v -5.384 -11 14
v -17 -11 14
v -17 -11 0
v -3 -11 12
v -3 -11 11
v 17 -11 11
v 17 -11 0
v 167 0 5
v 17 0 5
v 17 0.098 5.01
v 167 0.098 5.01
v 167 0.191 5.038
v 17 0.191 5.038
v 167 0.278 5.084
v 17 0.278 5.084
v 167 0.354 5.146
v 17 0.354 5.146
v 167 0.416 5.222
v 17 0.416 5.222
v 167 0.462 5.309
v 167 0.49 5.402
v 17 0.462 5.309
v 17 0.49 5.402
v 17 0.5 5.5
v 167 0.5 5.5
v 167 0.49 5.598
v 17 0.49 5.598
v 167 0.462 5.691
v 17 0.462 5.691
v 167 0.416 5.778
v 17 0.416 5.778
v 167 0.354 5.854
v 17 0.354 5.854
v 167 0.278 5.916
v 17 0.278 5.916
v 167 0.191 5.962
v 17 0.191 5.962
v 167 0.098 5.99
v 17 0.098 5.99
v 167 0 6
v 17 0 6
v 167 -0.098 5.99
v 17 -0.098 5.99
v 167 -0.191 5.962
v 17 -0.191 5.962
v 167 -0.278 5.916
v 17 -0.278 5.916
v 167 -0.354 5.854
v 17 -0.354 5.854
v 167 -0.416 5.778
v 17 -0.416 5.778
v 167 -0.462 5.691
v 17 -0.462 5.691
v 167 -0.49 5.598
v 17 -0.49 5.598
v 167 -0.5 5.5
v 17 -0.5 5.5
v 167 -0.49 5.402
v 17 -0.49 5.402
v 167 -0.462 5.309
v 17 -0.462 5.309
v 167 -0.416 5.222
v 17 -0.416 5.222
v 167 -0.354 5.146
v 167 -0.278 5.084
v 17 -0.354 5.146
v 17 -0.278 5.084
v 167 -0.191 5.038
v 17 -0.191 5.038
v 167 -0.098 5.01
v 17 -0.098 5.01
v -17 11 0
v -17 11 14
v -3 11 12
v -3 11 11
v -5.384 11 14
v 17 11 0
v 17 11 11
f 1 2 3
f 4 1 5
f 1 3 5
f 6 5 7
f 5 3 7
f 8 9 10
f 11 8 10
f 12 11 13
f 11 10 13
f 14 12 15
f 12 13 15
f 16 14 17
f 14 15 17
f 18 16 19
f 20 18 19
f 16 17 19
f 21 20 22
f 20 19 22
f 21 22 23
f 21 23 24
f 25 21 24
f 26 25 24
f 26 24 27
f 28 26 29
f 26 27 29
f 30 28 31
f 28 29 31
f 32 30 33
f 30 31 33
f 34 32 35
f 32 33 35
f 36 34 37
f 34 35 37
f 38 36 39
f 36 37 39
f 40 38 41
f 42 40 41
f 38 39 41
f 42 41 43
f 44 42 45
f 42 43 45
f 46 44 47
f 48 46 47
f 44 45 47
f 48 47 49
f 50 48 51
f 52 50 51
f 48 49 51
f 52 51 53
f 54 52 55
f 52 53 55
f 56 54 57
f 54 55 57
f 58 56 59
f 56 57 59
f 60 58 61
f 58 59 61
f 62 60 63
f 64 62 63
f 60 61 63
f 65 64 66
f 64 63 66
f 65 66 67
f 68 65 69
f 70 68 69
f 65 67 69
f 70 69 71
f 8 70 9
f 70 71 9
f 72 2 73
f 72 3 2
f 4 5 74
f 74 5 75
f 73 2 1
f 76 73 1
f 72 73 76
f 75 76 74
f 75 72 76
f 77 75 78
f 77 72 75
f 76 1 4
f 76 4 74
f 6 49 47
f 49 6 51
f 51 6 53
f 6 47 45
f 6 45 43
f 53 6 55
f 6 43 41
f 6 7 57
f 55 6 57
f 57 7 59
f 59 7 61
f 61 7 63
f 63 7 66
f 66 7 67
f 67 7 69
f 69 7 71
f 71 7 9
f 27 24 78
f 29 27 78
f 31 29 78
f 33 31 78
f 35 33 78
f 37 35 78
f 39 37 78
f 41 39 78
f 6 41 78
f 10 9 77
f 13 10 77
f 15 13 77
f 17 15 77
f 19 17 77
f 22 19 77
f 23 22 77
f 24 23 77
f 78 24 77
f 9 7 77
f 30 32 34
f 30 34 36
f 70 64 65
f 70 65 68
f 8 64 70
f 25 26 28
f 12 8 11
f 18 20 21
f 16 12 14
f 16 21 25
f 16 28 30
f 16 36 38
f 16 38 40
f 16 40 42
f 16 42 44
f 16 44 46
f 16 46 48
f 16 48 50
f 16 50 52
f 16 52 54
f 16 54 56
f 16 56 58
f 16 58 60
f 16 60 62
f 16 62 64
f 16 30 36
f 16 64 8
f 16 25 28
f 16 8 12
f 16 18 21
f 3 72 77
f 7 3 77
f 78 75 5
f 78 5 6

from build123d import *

# Parameters (mm, degrees)
CROQUIS1_W              = 34
CROQUIS1_H              = 22
SALIENTE_EXTRUIR1_DEPTH = 11
CROQUIS2_W              = 14
CROQUIS2_H              = 22
SALIENTE_EXTRUIR2_DEPTH = 3
CHAFL_N1_SIZE           = 2
CHAFL_N1_SIZE2          = 2.383507185
CROQUIS3_R              = 0.5
SALIENTE_EXTRUIR3_DEPTH = 150


with BuildPart() as part:
    # Croquis1 → Saliente-Extruir1 (new body)
    with BuildSketch(Plane.XY):
        Rectangle(CROQUIS1_W, CROQUIS1_H)
    extrude(amount=SALIENTE_EXTRUIR1_DEPTH)

    # Croquis2 → Saliente-Extruir2 (add)
    with BuildSketch(Plane.XY.offset(11)):
        with Locations((-10, 0)):
            Rectangle(CROQUIS2_W, CROQUIS2_H)
    extrude(amount=SALIENTE_EXTRUIR2_DEPTH)

    # Chaflán1
    chafl_n1_edges = [part.edges().sort_by_distance(p)[0] for p in [
        (-3, 0, 14),
    ]]
    chafl_n1_side = [part.faces().sort_by_distance(p)[0] for p in [
        (-3, 0, 12.5),
    ]]
    chamfer(chafl_n1_edges, length=CHAFL_N1_SIZE, length2=CHAFL_N1_SIZE2, reference=chafl_n1_side[0])

    # Croquis3 → Saliente-Extruir3 (add)
    with BuildSketch(Plane(origin=(17, 0, 0), x_dir=(0, 0, -1), z_dir=(1, 0, 0))):
        with Locations((-5.5, 0)):
            Circle(CROQUIS3_R)
    extrude(amount=SALIENTE_EXTRUIR3_DEPTH)


solid = part.part
